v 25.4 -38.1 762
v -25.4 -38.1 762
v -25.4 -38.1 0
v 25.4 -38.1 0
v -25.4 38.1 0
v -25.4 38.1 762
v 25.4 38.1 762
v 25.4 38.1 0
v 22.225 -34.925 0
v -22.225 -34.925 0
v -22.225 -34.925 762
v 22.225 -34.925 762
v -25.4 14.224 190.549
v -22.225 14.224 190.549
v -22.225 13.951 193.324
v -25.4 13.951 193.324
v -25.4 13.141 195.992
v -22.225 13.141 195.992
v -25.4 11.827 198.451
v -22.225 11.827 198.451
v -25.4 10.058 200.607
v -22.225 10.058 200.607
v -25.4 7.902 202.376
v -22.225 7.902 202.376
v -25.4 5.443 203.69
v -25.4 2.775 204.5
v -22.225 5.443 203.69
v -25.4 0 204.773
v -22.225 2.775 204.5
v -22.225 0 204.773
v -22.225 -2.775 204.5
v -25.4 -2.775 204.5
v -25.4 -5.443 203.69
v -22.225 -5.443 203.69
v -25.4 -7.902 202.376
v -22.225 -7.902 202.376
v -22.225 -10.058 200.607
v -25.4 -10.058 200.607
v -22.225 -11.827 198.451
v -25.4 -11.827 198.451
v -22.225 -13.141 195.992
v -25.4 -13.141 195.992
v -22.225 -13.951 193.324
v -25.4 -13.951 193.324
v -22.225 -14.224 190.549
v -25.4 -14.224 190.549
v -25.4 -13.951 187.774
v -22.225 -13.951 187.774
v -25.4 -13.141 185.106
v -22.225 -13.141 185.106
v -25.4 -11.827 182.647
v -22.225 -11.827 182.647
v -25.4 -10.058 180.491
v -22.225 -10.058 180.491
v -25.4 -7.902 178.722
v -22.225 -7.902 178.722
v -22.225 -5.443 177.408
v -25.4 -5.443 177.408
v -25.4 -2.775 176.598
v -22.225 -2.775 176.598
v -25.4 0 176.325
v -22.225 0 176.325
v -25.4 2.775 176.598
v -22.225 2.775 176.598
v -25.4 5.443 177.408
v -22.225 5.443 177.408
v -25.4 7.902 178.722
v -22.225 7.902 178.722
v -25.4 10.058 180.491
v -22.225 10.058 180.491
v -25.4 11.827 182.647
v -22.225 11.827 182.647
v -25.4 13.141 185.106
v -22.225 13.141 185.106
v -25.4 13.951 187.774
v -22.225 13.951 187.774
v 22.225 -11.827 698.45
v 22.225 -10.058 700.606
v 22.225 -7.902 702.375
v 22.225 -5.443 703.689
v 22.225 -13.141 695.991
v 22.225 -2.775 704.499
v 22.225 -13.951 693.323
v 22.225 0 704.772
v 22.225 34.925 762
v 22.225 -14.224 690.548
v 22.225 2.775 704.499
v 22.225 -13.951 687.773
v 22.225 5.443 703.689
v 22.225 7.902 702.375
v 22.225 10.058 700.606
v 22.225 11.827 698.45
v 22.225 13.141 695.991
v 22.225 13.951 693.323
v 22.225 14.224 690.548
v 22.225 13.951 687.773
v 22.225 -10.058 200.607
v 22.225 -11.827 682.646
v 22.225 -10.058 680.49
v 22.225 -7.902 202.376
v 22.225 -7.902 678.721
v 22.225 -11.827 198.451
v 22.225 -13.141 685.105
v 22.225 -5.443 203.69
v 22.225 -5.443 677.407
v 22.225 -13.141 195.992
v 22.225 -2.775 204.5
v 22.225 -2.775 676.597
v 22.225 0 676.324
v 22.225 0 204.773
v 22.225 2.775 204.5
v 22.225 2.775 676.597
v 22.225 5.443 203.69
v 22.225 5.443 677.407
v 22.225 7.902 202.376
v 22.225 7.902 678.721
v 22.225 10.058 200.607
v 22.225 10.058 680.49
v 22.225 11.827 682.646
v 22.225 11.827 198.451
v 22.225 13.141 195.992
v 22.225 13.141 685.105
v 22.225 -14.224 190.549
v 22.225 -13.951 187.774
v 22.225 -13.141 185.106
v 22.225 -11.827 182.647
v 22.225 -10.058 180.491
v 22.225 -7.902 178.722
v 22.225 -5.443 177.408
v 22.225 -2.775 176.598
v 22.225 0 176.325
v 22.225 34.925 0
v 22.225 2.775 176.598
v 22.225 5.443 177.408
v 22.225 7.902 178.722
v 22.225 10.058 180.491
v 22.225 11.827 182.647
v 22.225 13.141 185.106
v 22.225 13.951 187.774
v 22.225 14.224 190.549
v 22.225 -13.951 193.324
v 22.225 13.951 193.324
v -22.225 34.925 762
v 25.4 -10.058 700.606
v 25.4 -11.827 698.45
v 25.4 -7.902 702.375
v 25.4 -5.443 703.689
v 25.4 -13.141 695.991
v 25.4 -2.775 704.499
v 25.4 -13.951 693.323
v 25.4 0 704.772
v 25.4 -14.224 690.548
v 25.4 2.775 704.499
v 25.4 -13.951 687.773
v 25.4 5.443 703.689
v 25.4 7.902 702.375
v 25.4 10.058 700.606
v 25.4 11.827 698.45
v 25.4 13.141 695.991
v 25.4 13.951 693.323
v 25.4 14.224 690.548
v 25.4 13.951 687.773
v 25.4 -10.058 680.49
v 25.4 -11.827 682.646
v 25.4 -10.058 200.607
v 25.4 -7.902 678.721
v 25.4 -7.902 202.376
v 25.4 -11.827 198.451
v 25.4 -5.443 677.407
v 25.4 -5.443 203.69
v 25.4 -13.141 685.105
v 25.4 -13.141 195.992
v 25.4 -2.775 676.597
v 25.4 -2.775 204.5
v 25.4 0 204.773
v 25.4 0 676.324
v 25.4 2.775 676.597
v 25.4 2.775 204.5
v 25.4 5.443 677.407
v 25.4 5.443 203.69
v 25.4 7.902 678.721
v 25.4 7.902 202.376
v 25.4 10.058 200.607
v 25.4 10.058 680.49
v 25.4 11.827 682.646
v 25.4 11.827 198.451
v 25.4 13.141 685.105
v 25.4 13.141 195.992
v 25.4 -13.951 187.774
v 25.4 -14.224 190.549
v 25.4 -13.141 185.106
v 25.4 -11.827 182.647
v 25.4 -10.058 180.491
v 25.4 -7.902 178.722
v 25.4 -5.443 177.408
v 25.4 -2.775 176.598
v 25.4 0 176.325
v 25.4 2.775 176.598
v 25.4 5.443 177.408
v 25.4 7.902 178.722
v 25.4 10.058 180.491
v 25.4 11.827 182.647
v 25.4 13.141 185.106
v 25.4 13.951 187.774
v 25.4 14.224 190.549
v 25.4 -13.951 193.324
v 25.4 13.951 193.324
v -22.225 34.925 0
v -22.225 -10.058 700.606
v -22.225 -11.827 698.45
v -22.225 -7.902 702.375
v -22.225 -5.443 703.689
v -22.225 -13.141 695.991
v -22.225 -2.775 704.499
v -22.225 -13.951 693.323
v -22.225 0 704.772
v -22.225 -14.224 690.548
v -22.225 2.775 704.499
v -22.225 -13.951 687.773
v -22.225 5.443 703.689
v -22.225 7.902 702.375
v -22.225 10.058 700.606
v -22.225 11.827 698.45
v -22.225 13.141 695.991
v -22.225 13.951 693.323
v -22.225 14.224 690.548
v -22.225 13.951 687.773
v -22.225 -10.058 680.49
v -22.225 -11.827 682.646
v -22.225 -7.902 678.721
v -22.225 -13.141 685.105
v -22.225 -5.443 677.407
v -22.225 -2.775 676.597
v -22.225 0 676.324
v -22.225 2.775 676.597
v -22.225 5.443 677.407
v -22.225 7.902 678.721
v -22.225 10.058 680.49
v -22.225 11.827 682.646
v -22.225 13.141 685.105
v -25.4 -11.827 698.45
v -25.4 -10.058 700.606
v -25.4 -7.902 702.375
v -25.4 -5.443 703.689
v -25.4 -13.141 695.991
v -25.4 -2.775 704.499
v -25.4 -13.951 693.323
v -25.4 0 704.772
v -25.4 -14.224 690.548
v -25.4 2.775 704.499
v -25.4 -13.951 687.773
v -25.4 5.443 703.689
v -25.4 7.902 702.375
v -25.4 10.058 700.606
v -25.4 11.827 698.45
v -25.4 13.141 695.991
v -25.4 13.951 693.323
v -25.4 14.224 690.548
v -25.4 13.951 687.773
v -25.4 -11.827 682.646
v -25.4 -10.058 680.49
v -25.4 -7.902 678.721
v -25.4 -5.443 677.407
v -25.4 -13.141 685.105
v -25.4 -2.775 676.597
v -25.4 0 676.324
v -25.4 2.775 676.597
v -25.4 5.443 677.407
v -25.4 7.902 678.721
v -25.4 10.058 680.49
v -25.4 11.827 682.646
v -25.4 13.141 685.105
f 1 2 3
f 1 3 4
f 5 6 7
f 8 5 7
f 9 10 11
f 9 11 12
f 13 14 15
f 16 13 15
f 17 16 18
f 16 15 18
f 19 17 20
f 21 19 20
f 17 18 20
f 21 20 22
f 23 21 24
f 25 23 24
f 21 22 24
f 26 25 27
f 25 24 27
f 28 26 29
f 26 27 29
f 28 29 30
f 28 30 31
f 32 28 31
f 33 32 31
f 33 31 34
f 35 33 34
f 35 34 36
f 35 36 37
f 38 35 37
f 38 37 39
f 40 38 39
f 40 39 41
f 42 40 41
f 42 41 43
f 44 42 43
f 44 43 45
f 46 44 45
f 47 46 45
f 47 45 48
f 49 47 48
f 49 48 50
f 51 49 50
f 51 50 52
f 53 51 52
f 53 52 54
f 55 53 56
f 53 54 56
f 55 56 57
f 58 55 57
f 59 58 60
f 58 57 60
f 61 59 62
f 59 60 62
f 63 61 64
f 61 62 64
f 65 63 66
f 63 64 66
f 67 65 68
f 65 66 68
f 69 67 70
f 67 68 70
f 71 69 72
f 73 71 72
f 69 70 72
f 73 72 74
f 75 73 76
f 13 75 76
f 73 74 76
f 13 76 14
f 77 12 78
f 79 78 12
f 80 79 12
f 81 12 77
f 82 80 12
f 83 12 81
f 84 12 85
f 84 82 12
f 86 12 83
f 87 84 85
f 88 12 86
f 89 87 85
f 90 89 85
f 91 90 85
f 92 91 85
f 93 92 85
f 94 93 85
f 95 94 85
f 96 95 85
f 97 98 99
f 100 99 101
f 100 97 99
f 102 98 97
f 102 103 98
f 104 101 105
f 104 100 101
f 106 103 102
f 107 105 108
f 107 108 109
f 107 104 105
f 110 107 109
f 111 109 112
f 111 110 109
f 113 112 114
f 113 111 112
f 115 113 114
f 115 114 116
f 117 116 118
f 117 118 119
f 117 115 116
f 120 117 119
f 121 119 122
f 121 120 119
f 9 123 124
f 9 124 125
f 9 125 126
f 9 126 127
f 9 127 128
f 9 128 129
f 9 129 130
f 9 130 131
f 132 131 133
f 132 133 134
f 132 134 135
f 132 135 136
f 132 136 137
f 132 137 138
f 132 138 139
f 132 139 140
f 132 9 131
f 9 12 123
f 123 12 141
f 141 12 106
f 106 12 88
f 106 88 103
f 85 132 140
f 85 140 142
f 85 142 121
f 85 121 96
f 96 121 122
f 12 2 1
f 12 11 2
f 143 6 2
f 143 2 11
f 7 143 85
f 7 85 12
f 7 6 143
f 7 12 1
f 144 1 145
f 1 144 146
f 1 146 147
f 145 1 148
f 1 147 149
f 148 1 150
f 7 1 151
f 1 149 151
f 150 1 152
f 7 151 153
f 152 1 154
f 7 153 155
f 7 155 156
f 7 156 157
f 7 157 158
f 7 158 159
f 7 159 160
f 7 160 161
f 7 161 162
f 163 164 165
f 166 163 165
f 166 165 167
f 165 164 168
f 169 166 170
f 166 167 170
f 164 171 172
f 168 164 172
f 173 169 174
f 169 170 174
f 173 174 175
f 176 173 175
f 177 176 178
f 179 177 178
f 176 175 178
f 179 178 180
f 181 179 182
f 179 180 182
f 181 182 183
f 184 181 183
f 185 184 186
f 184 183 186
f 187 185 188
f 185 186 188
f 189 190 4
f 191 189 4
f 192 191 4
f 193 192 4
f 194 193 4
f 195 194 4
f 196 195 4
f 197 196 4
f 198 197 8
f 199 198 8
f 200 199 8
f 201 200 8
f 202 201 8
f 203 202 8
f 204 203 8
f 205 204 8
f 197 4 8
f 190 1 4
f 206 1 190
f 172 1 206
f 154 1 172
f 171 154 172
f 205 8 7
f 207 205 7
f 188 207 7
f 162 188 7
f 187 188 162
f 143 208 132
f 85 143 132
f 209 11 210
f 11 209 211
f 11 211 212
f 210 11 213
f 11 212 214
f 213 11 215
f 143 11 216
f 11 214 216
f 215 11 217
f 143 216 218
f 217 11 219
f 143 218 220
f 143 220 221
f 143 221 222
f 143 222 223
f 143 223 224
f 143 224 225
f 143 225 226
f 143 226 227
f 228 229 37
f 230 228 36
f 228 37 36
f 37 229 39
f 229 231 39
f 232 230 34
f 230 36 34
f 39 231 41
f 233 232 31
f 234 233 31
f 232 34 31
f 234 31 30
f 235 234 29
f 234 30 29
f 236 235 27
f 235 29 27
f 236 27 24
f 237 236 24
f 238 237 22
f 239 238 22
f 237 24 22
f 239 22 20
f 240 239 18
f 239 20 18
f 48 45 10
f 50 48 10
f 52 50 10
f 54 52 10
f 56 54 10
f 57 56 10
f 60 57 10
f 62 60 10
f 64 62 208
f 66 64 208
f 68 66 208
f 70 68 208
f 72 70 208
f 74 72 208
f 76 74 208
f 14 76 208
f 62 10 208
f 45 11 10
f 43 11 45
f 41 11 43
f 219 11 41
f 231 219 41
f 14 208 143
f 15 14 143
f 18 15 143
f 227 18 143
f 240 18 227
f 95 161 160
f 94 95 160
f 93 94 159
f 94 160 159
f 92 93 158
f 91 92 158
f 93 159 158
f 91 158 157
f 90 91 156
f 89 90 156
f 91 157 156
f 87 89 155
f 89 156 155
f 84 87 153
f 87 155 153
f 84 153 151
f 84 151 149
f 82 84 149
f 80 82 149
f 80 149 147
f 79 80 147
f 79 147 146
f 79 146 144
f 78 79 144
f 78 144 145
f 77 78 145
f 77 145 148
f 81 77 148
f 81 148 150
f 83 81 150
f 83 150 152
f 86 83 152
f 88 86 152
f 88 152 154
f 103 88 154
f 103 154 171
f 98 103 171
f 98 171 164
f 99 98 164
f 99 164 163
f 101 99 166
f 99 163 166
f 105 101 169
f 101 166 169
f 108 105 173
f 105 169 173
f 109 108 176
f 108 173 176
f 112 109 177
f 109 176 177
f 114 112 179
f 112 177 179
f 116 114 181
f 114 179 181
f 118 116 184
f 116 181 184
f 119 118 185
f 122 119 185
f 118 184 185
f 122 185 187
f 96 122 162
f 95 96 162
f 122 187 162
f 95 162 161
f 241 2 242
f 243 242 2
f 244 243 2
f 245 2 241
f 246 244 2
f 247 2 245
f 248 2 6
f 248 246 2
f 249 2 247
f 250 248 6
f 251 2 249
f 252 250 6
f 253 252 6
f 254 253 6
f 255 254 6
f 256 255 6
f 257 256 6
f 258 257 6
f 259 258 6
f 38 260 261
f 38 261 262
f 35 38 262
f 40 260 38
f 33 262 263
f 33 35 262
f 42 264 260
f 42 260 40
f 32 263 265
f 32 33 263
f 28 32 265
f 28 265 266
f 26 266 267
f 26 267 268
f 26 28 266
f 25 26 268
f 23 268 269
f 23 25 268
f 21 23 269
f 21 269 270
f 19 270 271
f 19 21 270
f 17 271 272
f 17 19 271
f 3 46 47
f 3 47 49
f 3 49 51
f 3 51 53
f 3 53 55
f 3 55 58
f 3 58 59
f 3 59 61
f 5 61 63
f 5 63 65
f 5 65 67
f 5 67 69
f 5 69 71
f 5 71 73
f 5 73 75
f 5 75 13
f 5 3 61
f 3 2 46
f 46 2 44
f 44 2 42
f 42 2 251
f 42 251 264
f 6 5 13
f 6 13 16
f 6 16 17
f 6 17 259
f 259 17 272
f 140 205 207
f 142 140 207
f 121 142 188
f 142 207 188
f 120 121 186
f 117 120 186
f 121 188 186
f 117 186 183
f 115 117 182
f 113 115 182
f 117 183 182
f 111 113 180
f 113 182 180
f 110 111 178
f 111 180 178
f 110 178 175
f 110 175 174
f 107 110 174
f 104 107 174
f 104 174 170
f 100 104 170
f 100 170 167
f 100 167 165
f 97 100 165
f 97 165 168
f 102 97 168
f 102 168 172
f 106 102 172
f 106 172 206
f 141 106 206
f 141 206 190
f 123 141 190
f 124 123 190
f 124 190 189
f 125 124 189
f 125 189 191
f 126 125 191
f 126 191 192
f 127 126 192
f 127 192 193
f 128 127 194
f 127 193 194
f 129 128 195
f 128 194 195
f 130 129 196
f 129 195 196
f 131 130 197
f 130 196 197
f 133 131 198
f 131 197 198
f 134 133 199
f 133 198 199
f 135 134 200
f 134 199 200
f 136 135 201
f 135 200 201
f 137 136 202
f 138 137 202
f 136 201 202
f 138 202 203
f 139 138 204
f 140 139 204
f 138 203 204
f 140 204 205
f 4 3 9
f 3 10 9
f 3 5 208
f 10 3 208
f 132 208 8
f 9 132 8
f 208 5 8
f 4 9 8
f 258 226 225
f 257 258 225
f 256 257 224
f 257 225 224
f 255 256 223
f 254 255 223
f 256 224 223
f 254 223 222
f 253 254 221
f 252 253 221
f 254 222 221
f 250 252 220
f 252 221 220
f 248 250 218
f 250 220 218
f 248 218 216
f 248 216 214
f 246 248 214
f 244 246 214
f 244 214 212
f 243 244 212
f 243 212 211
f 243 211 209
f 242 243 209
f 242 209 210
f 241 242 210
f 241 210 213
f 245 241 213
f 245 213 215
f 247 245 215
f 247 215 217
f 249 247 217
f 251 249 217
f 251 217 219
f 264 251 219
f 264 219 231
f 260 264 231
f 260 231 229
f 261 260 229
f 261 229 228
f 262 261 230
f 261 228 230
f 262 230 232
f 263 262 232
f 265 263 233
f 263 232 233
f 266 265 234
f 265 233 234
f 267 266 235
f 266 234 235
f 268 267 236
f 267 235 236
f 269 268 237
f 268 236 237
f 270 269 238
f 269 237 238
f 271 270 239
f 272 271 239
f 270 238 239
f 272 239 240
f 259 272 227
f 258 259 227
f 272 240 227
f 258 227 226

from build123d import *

# Parameters (mm, degrees)
SKETCH1_W           = 50.8
SKETCH1_H           = 76.2
SKETCH1_W_2         = 44.45
SKETCH1_H_2         = 69.85
BOSS_EXTRUDE1_DEPTH = 762
CUT_EXTRUDE1_REACH  = 766.641
SKETCH4_R           = 14.224


with BuildPart() as part:
    # Sketch1 → Boss-Extrude1 (new body)
    with BuildSketch(Plane.XY):
        Rectangle(SKETCH1_W, SKETCH1_H)
        Rectangle(SKETCH1_W_2, SKETCH1_H_2, mode=Mode.SUBTRACT)
    extrude(amount=BOSS_EXTRUDE1_DEPTH)

    # Cut-Extrude1: up to this face of the body (flat: up to its plane)
    cut_extrude1_end = Plane(part.part.faces().sort_by_distance((-25.4, 0, 381))[0])
    # Sketch4 → Cut-Extrude1 (cut, up to the picked face)
    with BuildSketch(Plane(origin=(25.4, 0, 0), x_dir=(0, 0, -1), z_dir=(1, 0, 0)), mode=Mode.PRIVATE) as cut_extrude1_sk1:
        with Locations(Location((-690.548048411, 0, 0), (0, 0, 90))):
            Circle(SKETCH4_R)
    cut_extrude1_tool1 = split(extrude(cut_extrude1_sk1.sketch, amount=-CUT_EXTRUDE1_REACH, mode=Mode.PRIVATE), bisect_by=cut_extrude1_end, keep=Keep.BOTH, mode=Mode.PRIVATE)
    # Sketch4 → Cut-Extrude1 (cut, up to the picked face)
    with BuildSketch(Plane(origin=(25.4, 0, 0), x_dir=(0, 0, -1), z_dir=(1, 0, 0)), mode=Mode.PRIVATE) as cut_extrude1_sk2:
        with Locations(Location((-190.549048411, 0, 0), (0, 0, 90))):
            Circle(SKETCH4_R)
    cut_extrude1_tool2 = split(extrude(cut_extrude1_sk2.sketch, amount=-CUT_EXTRUDE1_REACH, mode=Mode.PRIVATE), bisect_by=cut_extrude1_end, keep=Keep.BOTH, mode=Mode.PRIVATE)
    add(cut_extrude1_tool1.solids().sort_by(Axis((25.4, 0, 690.548048), (-1, 0, 0)))[0], mode=Mode.SUBTRACT)
    add(cut_extrude1_tool2.solids().sort_by(Axis((25.4, 0, 190.549048), (-1, 0, 0)))[0], mode=Mode.SUBTRACT)


solid = part.part
